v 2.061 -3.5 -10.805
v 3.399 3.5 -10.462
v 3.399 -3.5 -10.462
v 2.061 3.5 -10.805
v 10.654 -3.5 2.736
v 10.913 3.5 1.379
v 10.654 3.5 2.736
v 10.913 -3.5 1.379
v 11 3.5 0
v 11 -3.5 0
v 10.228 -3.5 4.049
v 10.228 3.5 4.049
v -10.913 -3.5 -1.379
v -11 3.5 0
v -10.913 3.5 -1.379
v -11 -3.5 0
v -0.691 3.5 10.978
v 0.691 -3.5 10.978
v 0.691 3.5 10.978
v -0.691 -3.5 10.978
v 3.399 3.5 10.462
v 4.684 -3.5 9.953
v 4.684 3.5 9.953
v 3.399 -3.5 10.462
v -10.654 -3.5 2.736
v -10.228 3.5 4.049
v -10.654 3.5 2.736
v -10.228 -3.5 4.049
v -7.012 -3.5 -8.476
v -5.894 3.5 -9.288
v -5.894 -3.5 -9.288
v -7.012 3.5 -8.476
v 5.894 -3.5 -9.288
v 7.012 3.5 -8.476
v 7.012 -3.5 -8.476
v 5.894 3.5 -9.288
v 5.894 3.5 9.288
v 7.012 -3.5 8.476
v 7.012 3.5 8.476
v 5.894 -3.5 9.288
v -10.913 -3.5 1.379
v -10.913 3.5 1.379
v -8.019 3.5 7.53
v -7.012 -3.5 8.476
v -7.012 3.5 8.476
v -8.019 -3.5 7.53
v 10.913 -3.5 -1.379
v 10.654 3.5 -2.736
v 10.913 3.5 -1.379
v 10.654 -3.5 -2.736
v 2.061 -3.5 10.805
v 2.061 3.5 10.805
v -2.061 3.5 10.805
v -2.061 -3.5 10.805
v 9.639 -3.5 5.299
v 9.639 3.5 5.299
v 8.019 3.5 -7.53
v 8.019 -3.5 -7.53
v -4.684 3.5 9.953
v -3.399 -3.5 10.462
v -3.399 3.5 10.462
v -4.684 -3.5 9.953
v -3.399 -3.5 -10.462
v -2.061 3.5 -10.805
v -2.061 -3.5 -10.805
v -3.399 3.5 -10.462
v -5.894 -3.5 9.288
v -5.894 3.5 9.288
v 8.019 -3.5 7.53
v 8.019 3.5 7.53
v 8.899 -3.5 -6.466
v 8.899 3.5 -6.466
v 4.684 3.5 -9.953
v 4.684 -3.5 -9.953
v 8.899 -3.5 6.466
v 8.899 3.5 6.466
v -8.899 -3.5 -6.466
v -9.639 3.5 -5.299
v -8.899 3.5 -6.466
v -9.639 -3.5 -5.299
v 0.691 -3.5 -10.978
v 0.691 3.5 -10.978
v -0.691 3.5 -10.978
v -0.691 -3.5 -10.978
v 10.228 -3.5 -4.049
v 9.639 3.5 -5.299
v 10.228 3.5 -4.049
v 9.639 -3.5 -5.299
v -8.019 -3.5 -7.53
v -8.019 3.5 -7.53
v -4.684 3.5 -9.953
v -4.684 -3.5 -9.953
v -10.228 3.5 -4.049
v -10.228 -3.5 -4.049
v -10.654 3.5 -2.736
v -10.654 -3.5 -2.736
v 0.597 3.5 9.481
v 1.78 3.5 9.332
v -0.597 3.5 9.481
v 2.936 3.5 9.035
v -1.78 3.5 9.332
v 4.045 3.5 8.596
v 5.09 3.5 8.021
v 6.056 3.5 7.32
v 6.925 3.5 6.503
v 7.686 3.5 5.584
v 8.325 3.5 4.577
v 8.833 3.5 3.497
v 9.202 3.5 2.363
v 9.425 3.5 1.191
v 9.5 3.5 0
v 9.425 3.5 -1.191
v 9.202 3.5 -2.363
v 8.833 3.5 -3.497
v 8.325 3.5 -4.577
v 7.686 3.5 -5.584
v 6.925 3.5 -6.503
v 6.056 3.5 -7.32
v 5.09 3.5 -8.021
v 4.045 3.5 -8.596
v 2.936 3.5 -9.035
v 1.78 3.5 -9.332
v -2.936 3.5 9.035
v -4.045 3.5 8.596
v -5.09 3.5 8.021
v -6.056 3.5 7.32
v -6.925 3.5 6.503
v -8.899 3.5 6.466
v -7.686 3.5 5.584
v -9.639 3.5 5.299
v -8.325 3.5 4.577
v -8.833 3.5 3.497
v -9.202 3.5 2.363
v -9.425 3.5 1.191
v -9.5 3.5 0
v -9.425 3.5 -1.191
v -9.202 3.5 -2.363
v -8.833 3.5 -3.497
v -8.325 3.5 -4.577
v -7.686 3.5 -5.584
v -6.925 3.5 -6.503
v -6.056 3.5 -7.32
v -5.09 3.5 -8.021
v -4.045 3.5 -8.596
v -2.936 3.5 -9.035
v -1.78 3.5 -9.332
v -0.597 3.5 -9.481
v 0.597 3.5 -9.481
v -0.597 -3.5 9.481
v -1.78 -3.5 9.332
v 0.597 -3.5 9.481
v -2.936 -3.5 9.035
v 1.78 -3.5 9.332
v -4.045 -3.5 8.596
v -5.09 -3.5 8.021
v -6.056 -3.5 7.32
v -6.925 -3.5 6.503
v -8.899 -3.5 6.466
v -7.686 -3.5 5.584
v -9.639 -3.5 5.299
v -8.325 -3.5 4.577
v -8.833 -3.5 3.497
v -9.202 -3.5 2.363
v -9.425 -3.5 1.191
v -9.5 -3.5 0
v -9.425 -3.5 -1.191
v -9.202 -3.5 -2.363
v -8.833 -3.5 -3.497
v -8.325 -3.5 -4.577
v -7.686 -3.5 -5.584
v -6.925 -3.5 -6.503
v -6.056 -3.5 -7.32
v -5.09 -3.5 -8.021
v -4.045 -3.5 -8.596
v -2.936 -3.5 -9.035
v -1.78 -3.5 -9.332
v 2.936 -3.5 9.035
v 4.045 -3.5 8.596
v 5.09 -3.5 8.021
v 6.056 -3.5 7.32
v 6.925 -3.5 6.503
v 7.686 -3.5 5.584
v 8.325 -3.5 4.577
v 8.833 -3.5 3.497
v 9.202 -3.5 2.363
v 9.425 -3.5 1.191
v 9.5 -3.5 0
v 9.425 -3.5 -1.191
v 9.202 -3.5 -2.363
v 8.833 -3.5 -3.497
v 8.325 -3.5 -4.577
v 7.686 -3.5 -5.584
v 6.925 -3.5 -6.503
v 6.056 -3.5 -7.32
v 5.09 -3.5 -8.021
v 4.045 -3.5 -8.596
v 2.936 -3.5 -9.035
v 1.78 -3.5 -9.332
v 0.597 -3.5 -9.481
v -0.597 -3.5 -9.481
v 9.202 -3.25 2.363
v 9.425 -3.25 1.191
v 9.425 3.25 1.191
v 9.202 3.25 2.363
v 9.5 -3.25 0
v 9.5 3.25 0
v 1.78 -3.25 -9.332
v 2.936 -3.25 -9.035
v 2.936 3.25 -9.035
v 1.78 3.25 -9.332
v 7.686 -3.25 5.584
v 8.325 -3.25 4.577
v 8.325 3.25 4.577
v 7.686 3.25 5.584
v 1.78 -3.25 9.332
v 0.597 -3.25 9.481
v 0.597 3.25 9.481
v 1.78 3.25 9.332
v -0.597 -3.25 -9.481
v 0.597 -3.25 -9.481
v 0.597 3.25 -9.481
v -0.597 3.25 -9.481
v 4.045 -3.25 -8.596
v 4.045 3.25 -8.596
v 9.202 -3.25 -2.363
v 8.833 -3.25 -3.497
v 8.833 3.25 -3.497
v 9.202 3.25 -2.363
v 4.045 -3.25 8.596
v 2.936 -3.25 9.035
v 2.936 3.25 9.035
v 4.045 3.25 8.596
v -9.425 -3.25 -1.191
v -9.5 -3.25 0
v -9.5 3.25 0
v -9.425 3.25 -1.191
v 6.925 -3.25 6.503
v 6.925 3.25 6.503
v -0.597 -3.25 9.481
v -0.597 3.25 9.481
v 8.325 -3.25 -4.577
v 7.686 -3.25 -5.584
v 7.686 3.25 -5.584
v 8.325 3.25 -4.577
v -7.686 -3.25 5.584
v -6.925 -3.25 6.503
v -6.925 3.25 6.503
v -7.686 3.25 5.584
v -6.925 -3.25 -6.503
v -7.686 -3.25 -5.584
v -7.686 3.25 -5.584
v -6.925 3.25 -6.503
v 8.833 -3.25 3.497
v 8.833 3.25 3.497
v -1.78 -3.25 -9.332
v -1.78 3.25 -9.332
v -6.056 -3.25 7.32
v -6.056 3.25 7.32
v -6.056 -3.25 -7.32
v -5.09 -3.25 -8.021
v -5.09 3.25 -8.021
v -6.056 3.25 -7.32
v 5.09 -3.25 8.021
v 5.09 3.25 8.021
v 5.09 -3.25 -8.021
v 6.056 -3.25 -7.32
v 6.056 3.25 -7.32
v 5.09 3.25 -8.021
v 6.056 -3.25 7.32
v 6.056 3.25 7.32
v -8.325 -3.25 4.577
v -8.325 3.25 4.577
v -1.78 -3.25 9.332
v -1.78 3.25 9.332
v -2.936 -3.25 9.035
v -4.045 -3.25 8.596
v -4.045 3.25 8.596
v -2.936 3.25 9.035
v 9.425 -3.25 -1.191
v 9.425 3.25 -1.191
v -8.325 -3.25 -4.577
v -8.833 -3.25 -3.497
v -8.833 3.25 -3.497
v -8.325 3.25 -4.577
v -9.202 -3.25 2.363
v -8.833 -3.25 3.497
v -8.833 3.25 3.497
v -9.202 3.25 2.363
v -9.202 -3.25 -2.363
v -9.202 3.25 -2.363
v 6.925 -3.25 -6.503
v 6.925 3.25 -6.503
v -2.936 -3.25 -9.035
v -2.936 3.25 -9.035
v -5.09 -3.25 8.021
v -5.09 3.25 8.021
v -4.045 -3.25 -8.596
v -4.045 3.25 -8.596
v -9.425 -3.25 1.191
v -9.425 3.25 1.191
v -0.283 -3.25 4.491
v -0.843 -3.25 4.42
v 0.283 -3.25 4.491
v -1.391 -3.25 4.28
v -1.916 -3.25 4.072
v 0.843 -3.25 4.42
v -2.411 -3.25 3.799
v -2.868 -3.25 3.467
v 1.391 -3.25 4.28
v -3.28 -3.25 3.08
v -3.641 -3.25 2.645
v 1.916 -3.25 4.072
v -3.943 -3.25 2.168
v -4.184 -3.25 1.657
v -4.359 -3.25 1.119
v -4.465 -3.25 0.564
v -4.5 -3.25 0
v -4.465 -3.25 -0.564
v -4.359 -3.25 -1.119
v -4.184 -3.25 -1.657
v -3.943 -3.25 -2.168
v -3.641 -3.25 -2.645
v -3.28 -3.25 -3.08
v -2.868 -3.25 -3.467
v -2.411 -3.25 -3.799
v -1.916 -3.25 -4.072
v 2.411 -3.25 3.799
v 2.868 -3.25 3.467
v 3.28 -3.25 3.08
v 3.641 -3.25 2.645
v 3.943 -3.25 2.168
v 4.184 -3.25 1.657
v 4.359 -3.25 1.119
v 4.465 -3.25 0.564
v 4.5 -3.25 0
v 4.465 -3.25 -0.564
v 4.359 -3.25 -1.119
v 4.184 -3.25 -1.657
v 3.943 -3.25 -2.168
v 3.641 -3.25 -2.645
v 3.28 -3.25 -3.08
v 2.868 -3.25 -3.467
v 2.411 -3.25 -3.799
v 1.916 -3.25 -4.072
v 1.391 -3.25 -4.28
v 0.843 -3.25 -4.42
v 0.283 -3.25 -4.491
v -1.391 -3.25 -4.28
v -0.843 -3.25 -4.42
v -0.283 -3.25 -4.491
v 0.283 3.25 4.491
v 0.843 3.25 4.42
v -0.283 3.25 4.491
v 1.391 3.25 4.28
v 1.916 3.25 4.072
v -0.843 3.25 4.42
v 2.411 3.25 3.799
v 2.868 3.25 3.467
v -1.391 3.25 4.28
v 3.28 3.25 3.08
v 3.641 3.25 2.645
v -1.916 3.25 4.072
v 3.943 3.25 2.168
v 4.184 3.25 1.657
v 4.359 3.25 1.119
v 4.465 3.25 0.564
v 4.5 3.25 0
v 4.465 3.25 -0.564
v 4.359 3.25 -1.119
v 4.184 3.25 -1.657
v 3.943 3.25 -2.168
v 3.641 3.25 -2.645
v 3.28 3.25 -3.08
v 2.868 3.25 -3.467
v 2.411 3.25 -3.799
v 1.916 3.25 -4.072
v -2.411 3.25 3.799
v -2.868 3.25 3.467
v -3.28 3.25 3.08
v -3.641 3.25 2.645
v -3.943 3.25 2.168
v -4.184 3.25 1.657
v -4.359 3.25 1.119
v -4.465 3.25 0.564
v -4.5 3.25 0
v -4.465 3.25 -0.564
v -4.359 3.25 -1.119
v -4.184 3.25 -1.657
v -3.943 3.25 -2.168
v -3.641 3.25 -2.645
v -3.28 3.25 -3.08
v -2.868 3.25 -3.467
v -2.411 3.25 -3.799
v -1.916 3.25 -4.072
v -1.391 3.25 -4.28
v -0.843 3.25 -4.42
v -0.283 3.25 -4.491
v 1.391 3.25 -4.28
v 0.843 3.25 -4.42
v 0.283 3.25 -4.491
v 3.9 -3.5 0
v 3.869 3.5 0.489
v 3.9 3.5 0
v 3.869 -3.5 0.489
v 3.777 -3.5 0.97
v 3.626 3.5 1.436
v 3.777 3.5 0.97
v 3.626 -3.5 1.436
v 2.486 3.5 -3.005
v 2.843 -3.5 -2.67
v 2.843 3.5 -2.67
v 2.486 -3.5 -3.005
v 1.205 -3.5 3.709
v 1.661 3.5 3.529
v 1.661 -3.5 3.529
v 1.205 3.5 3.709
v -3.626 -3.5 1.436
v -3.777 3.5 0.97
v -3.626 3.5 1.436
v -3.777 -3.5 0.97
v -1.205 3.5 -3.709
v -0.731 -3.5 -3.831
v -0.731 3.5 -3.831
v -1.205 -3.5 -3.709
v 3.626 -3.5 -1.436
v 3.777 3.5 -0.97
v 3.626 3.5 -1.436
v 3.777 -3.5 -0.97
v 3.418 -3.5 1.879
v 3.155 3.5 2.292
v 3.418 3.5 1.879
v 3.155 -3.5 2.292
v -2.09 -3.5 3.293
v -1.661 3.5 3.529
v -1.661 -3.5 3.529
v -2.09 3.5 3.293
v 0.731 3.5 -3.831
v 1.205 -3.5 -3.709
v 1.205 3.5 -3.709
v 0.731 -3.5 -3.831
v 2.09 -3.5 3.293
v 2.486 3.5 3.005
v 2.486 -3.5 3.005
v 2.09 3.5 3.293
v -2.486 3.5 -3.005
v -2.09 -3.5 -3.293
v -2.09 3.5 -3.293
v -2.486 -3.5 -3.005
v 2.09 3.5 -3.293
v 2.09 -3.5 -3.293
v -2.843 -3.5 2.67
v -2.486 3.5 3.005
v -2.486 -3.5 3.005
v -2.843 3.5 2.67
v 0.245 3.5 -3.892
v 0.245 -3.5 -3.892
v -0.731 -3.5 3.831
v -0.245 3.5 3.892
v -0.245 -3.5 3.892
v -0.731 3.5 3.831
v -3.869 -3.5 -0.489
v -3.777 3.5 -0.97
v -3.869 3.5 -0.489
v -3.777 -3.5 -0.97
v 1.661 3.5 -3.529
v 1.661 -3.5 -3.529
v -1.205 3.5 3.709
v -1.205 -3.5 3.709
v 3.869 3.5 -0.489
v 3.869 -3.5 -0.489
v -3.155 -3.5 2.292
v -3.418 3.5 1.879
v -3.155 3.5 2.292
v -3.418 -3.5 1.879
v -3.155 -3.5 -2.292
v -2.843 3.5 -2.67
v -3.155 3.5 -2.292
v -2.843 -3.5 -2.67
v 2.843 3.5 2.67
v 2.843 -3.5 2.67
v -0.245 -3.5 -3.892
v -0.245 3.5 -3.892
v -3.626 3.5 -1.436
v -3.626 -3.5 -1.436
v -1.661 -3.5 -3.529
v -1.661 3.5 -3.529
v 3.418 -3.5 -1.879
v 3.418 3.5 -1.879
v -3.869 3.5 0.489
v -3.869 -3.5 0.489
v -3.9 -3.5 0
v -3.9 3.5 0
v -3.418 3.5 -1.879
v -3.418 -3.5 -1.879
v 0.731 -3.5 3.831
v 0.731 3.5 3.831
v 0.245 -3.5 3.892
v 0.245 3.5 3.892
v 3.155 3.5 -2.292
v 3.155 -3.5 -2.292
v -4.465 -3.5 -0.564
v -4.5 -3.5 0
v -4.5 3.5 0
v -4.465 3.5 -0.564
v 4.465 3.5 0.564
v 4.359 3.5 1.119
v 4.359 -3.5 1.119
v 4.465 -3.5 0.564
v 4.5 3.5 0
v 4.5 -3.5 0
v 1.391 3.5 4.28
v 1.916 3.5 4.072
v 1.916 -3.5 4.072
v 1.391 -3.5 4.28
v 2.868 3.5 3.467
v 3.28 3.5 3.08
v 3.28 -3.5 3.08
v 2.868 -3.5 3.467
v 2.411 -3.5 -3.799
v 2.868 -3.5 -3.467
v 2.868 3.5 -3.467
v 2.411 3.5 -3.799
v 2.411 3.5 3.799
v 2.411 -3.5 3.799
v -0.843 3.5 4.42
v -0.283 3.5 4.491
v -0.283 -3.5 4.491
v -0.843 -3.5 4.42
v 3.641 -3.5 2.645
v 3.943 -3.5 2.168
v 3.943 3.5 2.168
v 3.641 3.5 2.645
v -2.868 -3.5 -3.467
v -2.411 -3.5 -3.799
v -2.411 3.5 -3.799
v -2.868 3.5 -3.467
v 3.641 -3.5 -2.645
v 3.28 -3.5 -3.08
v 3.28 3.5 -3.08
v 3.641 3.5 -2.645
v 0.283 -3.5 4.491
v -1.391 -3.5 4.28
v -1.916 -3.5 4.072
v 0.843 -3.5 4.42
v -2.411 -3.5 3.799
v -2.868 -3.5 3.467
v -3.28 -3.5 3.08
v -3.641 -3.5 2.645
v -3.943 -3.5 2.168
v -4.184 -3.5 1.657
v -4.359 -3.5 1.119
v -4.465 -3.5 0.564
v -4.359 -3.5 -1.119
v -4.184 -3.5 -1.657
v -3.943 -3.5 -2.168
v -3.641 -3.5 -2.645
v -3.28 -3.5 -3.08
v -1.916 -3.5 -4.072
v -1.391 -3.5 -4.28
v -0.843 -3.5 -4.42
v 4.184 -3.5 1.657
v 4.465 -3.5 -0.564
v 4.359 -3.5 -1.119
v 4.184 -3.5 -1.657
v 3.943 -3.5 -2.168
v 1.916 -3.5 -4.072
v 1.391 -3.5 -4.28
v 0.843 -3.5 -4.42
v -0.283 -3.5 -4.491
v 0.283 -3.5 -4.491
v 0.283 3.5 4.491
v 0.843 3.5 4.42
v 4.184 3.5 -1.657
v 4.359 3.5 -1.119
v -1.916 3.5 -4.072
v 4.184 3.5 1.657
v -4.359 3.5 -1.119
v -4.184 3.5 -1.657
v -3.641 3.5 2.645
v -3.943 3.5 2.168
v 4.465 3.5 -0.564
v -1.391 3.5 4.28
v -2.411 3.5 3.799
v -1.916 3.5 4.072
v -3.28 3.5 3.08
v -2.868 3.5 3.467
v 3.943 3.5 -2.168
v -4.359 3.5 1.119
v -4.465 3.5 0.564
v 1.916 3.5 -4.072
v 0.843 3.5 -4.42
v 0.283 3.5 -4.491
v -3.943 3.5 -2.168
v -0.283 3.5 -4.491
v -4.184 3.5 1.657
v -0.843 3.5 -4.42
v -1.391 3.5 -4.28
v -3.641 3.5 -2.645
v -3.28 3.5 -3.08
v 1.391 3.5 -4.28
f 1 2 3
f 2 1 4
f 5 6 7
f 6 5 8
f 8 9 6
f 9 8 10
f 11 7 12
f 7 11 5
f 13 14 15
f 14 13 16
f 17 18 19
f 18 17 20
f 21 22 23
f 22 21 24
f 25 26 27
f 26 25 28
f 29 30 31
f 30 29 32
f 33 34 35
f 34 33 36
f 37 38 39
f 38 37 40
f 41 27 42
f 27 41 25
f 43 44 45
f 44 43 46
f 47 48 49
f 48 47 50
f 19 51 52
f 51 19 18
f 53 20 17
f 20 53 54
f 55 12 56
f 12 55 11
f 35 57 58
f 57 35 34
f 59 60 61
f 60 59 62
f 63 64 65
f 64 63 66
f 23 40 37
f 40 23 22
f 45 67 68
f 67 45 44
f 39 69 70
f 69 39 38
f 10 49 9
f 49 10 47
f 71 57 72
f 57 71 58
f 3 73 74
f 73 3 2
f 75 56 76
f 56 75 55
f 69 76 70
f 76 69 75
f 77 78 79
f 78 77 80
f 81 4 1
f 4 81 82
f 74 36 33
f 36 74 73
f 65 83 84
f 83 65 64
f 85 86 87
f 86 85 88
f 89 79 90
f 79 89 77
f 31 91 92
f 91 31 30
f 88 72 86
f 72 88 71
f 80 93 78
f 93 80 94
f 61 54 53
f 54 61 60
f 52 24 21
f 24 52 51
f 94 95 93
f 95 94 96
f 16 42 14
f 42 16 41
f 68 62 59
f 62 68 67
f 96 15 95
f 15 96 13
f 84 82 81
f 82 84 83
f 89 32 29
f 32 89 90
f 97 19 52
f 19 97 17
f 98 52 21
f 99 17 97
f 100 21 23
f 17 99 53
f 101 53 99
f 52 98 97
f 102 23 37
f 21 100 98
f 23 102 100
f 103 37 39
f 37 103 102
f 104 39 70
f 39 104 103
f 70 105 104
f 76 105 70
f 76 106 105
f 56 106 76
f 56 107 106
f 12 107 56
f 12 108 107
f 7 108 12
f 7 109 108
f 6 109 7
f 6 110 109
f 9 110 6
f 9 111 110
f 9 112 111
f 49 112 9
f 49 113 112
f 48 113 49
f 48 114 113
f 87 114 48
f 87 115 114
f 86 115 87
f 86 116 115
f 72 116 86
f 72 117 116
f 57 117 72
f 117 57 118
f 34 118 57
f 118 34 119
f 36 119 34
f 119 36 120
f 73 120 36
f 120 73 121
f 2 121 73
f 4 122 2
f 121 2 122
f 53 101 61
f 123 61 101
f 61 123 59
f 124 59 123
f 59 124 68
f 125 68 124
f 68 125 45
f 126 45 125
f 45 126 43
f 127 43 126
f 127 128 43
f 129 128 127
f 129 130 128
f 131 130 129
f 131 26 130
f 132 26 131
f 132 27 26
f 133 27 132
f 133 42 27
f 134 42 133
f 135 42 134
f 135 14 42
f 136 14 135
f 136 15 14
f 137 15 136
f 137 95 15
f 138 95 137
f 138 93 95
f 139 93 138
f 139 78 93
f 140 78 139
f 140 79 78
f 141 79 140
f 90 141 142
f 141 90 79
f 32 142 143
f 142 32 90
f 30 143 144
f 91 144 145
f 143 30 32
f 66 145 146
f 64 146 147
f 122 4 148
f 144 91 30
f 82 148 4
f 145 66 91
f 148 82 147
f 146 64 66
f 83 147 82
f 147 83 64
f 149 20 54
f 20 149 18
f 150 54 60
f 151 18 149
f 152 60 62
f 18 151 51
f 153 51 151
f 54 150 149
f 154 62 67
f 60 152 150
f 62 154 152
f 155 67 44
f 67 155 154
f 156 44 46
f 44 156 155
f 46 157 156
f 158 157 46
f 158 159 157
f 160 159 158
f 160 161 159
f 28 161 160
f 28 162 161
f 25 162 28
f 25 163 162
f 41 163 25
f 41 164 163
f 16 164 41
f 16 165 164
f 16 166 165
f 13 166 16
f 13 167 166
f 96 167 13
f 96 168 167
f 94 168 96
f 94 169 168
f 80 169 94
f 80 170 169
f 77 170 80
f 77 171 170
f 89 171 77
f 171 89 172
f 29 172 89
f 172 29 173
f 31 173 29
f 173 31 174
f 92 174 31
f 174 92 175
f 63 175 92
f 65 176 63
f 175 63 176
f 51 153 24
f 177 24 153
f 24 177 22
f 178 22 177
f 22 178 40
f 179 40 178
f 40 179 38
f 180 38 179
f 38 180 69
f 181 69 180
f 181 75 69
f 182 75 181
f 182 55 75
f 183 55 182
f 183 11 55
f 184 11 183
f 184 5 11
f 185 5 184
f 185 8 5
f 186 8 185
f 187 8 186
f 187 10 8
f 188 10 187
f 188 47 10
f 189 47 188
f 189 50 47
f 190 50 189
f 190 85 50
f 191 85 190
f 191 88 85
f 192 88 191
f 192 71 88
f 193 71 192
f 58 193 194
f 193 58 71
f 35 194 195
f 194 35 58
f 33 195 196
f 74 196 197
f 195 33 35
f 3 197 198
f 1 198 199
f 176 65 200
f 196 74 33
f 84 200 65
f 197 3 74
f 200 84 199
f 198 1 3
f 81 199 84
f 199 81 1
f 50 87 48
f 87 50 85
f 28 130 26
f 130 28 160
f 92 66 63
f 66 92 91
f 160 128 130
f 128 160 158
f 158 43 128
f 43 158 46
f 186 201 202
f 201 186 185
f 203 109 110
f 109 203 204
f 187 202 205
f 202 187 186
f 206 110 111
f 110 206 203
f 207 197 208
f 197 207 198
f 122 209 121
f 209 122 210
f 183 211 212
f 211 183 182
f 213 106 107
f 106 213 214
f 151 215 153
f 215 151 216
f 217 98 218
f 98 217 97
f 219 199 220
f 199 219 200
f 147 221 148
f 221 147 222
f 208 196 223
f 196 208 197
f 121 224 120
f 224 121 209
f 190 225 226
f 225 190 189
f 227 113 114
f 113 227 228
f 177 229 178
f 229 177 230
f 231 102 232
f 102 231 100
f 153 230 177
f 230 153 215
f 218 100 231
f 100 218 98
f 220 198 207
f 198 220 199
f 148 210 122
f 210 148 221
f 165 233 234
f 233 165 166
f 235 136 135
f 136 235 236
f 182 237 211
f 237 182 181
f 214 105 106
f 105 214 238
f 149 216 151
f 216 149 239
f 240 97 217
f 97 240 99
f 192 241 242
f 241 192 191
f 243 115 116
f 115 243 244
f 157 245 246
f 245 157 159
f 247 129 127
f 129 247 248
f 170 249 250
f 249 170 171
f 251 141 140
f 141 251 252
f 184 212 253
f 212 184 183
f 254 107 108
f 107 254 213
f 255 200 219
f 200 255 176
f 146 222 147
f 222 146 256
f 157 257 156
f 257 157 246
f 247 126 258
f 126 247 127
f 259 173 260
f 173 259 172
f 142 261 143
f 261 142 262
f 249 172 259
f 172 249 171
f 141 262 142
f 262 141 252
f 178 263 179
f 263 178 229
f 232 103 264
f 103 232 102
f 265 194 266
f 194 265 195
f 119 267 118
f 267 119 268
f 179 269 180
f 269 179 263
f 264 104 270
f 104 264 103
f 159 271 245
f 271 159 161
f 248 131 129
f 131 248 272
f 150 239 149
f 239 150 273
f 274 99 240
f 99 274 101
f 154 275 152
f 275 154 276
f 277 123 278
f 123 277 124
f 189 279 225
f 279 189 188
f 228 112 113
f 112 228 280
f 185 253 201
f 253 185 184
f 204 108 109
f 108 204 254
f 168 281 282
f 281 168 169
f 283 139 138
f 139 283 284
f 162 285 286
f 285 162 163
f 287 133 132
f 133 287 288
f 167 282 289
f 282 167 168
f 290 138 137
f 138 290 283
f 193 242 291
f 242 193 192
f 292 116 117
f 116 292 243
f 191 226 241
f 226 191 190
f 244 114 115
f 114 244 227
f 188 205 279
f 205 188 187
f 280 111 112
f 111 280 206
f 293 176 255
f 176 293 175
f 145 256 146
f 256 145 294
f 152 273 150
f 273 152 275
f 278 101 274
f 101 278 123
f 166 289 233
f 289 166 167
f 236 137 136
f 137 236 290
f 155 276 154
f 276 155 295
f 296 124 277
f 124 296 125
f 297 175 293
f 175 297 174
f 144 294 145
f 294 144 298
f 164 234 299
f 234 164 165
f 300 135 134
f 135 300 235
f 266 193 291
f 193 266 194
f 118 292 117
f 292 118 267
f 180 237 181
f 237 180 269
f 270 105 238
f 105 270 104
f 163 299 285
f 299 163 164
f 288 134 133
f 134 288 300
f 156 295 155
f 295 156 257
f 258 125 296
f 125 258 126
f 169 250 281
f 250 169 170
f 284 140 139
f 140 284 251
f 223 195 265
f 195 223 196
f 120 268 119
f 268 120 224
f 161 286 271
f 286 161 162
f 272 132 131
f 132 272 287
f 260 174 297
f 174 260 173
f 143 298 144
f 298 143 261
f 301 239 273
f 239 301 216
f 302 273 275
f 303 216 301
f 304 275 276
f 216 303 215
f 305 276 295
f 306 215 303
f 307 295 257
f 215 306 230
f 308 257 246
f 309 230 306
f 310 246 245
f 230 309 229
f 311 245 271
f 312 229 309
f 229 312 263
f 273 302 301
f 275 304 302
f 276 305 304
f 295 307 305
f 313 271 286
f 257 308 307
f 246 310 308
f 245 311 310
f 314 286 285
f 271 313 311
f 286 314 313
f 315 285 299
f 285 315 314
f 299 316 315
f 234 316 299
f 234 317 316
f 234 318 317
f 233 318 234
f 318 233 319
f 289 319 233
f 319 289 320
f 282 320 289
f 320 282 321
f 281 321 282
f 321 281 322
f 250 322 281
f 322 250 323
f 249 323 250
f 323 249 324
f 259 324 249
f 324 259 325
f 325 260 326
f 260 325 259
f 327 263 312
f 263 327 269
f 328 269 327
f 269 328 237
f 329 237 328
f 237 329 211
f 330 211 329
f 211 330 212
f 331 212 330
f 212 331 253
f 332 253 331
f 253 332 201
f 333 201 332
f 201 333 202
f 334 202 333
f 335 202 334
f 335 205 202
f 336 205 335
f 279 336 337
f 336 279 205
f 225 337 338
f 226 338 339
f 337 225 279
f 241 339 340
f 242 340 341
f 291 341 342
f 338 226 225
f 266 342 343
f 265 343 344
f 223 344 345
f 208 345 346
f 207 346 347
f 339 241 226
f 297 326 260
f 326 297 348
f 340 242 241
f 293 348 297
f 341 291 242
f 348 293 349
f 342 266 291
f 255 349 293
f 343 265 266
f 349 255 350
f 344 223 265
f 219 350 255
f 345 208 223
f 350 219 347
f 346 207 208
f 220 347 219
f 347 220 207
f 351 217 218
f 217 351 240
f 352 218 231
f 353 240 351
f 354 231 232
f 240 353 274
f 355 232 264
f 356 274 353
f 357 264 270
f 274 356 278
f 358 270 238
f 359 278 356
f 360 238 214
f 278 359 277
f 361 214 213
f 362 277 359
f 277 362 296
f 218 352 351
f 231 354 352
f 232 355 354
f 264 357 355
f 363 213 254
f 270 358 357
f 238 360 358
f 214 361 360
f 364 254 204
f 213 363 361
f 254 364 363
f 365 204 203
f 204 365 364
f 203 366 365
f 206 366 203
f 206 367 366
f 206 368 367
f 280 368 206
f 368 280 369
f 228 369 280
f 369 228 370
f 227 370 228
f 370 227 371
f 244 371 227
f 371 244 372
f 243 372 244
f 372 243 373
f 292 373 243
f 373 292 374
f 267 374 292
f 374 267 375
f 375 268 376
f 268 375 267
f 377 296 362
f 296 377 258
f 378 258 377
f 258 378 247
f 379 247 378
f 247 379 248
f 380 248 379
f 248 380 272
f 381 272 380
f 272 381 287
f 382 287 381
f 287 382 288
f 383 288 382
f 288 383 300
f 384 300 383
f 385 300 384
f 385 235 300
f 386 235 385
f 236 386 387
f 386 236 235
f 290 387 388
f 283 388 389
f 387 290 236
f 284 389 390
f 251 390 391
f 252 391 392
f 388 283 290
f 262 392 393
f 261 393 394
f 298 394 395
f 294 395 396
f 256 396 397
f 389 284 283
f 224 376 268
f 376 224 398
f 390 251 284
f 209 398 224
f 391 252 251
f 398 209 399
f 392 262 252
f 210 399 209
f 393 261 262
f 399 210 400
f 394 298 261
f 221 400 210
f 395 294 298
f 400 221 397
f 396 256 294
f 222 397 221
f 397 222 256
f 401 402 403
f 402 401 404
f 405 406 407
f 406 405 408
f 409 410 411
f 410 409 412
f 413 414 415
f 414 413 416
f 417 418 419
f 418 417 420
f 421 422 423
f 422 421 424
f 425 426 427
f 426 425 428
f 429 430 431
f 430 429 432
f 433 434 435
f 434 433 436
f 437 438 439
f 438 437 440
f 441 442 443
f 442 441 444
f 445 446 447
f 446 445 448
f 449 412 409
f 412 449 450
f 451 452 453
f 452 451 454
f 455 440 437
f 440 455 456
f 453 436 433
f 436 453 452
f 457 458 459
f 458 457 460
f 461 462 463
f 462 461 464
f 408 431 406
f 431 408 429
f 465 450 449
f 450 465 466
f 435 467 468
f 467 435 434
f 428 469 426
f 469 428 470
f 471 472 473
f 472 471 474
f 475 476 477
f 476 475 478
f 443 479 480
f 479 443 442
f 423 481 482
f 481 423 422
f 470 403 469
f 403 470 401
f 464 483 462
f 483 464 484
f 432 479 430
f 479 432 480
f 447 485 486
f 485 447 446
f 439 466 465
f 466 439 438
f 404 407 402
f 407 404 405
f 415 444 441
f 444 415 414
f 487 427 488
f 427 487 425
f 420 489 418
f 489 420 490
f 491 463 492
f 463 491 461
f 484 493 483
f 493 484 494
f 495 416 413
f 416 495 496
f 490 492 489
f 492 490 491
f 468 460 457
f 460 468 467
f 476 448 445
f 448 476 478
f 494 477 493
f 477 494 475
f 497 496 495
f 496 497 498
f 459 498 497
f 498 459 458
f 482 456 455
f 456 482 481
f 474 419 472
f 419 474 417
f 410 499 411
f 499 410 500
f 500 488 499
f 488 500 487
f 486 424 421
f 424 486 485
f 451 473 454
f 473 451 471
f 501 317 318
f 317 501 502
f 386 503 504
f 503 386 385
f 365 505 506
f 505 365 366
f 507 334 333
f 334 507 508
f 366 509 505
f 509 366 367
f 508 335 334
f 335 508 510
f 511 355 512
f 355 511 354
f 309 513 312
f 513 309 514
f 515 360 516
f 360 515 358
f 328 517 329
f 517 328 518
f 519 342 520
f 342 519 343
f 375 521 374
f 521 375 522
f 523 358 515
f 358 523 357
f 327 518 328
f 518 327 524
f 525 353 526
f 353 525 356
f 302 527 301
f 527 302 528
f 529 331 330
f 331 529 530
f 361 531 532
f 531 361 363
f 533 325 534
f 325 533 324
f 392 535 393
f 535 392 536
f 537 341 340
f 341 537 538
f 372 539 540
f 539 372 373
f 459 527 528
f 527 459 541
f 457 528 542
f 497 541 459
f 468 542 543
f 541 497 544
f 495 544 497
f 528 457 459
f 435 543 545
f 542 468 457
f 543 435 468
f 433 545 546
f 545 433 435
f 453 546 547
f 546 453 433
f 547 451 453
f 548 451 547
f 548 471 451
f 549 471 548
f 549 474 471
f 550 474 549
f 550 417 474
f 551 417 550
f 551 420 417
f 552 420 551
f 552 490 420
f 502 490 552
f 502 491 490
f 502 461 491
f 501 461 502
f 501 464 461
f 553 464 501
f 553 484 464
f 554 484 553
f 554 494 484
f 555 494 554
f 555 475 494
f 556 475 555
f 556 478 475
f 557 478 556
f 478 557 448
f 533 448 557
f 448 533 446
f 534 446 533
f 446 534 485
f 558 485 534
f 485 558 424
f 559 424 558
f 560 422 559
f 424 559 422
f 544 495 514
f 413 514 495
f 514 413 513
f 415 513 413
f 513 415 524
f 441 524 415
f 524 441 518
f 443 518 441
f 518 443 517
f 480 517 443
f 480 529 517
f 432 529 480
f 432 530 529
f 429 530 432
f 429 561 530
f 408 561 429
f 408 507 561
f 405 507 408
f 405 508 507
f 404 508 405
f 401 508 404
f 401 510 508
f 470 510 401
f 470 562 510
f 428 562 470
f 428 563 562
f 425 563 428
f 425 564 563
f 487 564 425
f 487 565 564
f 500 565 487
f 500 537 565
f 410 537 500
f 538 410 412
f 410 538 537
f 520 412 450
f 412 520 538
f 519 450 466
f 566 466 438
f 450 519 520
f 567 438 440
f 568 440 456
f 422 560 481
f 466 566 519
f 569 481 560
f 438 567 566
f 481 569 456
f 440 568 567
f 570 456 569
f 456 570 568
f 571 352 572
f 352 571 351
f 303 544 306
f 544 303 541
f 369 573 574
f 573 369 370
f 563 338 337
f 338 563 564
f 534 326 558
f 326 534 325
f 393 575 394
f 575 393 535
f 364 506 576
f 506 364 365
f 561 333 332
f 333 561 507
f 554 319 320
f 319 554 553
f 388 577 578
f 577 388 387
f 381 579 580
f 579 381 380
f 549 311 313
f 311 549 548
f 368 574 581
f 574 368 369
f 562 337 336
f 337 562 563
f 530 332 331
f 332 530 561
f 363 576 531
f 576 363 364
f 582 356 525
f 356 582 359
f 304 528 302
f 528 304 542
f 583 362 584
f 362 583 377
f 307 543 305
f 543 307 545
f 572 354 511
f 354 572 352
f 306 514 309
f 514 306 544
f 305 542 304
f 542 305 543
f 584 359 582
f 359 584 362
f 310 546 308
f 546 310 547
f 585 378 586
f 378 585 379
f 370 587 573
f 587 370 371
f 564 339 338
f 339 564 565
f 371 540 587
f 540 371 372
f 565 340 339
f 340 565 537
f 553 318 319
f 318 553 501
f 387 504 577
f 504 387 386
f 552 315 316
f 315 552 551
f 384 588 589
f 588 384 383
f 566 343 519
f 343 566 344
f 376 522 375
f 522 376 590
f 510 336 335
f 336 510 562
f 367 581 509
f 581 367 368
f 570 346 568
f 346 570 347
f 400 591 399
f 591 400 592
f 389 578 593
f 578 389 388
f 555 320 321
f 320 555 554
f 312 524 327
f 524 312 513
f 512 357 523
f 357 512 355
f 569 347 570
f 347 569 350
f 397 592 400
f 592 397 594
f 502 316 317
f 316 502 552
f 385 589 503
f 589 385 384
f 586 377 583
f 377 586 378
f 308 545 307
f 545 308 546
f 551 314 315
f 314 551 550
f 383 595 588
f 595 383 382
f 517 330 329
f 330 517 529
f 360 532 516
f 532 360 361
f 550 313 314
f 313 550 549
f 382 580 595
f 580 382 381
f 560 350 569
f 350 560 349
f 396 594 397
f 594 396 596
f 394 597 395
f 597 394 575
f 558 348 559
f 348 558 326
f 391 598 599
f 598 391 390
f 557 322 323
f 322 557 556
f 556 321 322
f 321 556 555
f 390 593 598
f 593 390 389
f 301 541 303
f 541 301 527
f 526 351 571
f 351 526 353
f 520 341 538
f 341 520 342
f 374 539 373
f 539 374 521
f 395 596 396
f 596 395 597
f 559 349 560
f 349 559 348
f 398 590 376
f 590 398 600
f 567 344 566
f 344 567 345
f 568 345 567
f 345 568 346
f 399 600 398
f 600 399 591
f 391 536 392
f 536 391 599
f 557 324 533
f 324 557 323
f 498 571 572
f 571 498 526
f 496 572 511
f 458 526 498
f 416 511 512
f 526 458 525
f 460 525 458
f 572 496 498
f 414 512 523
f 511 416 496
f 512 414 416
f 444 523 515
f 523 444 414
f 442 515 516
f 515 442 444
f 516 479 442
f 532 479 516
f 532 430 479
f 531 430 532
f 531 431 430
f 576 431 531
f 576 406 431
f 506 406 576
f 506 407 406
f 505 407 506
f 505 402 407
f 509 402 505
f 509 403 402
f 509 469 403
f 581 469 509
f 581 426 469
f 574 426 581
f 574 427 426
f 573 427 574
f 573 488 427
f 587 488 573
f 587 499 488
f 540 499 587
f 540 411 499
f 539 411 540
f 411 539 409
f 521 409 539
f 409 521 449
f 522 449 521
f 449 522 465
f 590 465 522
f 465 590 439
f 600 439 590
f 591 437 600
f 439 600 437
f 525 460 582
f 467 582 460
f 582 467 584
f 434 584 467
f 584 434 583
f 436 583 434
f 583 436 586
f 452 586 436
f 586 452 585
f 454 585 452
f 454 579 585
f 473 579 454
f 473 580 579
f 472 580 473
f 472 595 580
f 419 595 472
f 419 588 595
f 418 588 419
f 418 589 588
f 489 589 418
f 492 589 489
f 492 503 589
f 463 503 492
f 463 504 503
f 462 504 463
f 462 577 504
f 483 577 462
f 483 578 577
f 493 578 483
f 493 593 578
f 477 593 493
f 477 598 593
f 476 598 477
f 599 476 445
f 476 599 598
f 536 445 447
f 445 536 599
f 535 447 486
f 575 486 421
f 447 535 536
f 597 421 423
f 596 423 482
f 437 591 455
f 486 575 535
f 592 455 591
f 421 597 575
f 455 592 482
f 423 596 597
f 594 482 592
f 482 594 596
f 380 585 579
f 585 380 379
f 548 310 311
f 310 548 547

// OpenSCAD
module bearing(){
	difference(){
		rotate([90,0,0]) cylinder(r=11,h=7,$fn=50,center=true);
		color([0.5,0.5,0.5]) rotate([90,0,0]) cylinder(r=9.5,h=8,$fn=50,center=true);		
	}		
	difference(){
		rotate([90,0,0]) cylinder(r=10,h=6.5,$fn=50,center=true);
		color([0.5,0.5,0.5]) rotate([90,0,0]) cylinder(r=3.9,h=8,$fn=50,center=true);
	}
	difference(){
		rotate([90,0,0]) cylinder(r=4.5,h=7,$fn=50,center=true);
		color([0.5,0.5,0.5]) rotate([90,0,0]) cylinder(r=3.9,h=8,$fn=50,center=true);
	}
}

bearing();
